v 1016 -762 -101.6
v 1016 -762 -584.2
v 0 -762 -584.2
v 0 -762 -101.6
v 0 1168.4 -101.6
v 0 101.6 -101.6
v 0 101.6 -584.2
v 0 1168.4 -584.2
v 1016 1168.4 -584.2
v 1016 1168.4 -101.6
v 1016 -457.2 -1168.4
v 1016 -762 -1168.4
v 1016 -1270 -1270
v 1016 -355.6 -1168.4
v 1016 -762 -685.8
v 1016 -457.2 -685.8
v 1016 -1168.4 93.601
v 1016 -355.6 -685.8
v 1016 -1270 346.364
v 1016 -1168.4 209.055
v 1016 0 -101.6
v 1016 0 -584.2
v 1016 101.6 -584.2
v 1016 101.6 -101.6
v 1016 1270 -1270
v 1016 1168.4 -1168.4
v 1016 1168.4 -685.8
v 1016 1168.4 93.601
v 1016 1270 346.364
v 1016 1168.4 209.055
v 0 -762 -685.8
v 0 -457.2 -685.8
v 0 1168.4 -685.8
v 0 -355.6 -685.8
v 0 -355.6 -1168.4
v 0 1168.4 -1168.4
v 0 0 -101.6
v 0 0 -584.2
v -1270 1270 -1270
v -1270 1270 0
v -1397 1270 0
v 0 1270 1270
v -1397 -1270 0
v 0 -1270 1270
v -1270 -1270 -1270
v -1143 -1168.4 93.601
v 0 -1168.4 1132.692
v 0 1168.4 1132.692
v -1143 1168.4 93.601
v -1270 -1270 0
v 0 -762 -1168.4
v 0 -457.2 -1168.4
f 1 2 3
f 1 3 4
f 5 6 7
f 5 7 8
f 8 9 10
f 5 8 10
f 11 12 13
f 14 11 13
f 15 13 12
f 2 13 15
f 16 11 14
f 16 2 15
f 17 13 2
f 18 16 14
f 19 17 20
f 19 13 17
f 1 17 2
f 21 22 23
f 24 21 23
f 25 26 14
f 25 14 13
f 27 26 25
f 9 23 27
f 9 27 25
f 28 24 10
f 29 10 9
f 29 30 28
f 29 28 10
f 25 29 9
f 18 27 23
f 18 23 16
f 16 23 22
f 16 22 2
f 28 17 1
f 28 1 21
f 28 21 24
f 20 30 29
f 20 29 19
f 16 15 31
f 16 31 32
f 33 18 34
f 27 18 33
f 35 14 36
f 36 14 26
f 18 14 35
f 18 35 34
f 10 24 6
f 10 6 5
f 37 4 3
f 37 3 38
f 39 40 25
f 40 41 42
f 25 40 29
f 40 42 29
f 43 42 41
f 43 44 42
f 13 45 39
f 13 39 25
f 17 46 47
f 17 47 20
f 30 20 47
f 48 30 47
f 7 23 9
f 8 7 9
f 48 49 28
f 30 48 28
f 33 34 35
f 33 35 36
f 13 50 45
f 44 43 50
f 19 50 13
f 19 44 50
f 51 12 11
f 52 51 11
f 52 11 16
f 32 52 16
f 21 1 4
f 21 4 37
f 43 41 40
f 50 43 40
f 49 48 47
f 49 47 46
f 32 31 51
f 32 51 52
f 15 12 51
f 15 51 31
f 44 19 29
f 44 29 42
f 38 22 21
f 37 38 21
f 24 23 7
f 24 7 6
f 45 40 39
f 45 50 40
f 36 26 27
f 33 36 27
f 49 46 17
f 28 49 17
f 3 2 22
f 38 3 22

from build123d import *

# Parameters (mm, degrees)
F4_DEPTH = 1270
F6_DEPTH = 1168.4
F1_W     = 1066.8
F1_H     = 482.6
F1_W_2   = 762
F1_W_3   = 304.8
F1_W_4   = 1524
F7_DEPTH = 1168.4
F2_W     = 3160.2668762207
F2_H     = 3479.4540405273
F8_DEPTH = 254


with BuildPart() as f4:
    # F3 (on Front) → F4 (new body, symmetric)
    with BuildSketch(Plane.XZ):
        Polygon((-1270, 0), (-1270, -1270), (1270, -1270), (1270, 0), (1397, 0), (0, 1270), (-1397, 0), align=None)
    extrude(amount=F4_DEPTH, both=True)

    # F5 (on Front) → F6 (cut, symmetric)
    with BuildSketch(Plane.XZ):
        Polygon((0, 1132.6915832066), (-1143, 93.6006741157), (1143, 93.6006741157), align=None)
    extrude(amount=F6_DEPTH, both=True, mode=Mode.SUBTRACT)

    # F1 (on offset) → F7 (cut)
    with BuildSketch(Plane.YZ.offset(1168.4)):
        with Locations((635, -342.9)):
            Rectangle(F1_W, F1_H)
        with Locations((-381, -342.9)):
            Rectangle(F1_W_2, F1_H)
        with Locations((-609.6, -927.1)):
            Rectangle(F1_W_3, F1_H)
        with Locations((406.4, -927.1)):
            Rectangle(F1_W_4, F1_H)
    extrude(amount=-F7_DEPTH, mode=Mode.SUBTRACT)

    # F2 (on face) → F8 (cut, symmetric)
    with BuildSketch(Plane.YZ.offset(1270)):
        with Locations((110.6095314026, 165.9138202667)):
            Rectangle(F2_W, F2_H)
    extrude(amount=F8_DEPTH, both=True, mode=Mode.SUBTRACT)


solid = f4.part
